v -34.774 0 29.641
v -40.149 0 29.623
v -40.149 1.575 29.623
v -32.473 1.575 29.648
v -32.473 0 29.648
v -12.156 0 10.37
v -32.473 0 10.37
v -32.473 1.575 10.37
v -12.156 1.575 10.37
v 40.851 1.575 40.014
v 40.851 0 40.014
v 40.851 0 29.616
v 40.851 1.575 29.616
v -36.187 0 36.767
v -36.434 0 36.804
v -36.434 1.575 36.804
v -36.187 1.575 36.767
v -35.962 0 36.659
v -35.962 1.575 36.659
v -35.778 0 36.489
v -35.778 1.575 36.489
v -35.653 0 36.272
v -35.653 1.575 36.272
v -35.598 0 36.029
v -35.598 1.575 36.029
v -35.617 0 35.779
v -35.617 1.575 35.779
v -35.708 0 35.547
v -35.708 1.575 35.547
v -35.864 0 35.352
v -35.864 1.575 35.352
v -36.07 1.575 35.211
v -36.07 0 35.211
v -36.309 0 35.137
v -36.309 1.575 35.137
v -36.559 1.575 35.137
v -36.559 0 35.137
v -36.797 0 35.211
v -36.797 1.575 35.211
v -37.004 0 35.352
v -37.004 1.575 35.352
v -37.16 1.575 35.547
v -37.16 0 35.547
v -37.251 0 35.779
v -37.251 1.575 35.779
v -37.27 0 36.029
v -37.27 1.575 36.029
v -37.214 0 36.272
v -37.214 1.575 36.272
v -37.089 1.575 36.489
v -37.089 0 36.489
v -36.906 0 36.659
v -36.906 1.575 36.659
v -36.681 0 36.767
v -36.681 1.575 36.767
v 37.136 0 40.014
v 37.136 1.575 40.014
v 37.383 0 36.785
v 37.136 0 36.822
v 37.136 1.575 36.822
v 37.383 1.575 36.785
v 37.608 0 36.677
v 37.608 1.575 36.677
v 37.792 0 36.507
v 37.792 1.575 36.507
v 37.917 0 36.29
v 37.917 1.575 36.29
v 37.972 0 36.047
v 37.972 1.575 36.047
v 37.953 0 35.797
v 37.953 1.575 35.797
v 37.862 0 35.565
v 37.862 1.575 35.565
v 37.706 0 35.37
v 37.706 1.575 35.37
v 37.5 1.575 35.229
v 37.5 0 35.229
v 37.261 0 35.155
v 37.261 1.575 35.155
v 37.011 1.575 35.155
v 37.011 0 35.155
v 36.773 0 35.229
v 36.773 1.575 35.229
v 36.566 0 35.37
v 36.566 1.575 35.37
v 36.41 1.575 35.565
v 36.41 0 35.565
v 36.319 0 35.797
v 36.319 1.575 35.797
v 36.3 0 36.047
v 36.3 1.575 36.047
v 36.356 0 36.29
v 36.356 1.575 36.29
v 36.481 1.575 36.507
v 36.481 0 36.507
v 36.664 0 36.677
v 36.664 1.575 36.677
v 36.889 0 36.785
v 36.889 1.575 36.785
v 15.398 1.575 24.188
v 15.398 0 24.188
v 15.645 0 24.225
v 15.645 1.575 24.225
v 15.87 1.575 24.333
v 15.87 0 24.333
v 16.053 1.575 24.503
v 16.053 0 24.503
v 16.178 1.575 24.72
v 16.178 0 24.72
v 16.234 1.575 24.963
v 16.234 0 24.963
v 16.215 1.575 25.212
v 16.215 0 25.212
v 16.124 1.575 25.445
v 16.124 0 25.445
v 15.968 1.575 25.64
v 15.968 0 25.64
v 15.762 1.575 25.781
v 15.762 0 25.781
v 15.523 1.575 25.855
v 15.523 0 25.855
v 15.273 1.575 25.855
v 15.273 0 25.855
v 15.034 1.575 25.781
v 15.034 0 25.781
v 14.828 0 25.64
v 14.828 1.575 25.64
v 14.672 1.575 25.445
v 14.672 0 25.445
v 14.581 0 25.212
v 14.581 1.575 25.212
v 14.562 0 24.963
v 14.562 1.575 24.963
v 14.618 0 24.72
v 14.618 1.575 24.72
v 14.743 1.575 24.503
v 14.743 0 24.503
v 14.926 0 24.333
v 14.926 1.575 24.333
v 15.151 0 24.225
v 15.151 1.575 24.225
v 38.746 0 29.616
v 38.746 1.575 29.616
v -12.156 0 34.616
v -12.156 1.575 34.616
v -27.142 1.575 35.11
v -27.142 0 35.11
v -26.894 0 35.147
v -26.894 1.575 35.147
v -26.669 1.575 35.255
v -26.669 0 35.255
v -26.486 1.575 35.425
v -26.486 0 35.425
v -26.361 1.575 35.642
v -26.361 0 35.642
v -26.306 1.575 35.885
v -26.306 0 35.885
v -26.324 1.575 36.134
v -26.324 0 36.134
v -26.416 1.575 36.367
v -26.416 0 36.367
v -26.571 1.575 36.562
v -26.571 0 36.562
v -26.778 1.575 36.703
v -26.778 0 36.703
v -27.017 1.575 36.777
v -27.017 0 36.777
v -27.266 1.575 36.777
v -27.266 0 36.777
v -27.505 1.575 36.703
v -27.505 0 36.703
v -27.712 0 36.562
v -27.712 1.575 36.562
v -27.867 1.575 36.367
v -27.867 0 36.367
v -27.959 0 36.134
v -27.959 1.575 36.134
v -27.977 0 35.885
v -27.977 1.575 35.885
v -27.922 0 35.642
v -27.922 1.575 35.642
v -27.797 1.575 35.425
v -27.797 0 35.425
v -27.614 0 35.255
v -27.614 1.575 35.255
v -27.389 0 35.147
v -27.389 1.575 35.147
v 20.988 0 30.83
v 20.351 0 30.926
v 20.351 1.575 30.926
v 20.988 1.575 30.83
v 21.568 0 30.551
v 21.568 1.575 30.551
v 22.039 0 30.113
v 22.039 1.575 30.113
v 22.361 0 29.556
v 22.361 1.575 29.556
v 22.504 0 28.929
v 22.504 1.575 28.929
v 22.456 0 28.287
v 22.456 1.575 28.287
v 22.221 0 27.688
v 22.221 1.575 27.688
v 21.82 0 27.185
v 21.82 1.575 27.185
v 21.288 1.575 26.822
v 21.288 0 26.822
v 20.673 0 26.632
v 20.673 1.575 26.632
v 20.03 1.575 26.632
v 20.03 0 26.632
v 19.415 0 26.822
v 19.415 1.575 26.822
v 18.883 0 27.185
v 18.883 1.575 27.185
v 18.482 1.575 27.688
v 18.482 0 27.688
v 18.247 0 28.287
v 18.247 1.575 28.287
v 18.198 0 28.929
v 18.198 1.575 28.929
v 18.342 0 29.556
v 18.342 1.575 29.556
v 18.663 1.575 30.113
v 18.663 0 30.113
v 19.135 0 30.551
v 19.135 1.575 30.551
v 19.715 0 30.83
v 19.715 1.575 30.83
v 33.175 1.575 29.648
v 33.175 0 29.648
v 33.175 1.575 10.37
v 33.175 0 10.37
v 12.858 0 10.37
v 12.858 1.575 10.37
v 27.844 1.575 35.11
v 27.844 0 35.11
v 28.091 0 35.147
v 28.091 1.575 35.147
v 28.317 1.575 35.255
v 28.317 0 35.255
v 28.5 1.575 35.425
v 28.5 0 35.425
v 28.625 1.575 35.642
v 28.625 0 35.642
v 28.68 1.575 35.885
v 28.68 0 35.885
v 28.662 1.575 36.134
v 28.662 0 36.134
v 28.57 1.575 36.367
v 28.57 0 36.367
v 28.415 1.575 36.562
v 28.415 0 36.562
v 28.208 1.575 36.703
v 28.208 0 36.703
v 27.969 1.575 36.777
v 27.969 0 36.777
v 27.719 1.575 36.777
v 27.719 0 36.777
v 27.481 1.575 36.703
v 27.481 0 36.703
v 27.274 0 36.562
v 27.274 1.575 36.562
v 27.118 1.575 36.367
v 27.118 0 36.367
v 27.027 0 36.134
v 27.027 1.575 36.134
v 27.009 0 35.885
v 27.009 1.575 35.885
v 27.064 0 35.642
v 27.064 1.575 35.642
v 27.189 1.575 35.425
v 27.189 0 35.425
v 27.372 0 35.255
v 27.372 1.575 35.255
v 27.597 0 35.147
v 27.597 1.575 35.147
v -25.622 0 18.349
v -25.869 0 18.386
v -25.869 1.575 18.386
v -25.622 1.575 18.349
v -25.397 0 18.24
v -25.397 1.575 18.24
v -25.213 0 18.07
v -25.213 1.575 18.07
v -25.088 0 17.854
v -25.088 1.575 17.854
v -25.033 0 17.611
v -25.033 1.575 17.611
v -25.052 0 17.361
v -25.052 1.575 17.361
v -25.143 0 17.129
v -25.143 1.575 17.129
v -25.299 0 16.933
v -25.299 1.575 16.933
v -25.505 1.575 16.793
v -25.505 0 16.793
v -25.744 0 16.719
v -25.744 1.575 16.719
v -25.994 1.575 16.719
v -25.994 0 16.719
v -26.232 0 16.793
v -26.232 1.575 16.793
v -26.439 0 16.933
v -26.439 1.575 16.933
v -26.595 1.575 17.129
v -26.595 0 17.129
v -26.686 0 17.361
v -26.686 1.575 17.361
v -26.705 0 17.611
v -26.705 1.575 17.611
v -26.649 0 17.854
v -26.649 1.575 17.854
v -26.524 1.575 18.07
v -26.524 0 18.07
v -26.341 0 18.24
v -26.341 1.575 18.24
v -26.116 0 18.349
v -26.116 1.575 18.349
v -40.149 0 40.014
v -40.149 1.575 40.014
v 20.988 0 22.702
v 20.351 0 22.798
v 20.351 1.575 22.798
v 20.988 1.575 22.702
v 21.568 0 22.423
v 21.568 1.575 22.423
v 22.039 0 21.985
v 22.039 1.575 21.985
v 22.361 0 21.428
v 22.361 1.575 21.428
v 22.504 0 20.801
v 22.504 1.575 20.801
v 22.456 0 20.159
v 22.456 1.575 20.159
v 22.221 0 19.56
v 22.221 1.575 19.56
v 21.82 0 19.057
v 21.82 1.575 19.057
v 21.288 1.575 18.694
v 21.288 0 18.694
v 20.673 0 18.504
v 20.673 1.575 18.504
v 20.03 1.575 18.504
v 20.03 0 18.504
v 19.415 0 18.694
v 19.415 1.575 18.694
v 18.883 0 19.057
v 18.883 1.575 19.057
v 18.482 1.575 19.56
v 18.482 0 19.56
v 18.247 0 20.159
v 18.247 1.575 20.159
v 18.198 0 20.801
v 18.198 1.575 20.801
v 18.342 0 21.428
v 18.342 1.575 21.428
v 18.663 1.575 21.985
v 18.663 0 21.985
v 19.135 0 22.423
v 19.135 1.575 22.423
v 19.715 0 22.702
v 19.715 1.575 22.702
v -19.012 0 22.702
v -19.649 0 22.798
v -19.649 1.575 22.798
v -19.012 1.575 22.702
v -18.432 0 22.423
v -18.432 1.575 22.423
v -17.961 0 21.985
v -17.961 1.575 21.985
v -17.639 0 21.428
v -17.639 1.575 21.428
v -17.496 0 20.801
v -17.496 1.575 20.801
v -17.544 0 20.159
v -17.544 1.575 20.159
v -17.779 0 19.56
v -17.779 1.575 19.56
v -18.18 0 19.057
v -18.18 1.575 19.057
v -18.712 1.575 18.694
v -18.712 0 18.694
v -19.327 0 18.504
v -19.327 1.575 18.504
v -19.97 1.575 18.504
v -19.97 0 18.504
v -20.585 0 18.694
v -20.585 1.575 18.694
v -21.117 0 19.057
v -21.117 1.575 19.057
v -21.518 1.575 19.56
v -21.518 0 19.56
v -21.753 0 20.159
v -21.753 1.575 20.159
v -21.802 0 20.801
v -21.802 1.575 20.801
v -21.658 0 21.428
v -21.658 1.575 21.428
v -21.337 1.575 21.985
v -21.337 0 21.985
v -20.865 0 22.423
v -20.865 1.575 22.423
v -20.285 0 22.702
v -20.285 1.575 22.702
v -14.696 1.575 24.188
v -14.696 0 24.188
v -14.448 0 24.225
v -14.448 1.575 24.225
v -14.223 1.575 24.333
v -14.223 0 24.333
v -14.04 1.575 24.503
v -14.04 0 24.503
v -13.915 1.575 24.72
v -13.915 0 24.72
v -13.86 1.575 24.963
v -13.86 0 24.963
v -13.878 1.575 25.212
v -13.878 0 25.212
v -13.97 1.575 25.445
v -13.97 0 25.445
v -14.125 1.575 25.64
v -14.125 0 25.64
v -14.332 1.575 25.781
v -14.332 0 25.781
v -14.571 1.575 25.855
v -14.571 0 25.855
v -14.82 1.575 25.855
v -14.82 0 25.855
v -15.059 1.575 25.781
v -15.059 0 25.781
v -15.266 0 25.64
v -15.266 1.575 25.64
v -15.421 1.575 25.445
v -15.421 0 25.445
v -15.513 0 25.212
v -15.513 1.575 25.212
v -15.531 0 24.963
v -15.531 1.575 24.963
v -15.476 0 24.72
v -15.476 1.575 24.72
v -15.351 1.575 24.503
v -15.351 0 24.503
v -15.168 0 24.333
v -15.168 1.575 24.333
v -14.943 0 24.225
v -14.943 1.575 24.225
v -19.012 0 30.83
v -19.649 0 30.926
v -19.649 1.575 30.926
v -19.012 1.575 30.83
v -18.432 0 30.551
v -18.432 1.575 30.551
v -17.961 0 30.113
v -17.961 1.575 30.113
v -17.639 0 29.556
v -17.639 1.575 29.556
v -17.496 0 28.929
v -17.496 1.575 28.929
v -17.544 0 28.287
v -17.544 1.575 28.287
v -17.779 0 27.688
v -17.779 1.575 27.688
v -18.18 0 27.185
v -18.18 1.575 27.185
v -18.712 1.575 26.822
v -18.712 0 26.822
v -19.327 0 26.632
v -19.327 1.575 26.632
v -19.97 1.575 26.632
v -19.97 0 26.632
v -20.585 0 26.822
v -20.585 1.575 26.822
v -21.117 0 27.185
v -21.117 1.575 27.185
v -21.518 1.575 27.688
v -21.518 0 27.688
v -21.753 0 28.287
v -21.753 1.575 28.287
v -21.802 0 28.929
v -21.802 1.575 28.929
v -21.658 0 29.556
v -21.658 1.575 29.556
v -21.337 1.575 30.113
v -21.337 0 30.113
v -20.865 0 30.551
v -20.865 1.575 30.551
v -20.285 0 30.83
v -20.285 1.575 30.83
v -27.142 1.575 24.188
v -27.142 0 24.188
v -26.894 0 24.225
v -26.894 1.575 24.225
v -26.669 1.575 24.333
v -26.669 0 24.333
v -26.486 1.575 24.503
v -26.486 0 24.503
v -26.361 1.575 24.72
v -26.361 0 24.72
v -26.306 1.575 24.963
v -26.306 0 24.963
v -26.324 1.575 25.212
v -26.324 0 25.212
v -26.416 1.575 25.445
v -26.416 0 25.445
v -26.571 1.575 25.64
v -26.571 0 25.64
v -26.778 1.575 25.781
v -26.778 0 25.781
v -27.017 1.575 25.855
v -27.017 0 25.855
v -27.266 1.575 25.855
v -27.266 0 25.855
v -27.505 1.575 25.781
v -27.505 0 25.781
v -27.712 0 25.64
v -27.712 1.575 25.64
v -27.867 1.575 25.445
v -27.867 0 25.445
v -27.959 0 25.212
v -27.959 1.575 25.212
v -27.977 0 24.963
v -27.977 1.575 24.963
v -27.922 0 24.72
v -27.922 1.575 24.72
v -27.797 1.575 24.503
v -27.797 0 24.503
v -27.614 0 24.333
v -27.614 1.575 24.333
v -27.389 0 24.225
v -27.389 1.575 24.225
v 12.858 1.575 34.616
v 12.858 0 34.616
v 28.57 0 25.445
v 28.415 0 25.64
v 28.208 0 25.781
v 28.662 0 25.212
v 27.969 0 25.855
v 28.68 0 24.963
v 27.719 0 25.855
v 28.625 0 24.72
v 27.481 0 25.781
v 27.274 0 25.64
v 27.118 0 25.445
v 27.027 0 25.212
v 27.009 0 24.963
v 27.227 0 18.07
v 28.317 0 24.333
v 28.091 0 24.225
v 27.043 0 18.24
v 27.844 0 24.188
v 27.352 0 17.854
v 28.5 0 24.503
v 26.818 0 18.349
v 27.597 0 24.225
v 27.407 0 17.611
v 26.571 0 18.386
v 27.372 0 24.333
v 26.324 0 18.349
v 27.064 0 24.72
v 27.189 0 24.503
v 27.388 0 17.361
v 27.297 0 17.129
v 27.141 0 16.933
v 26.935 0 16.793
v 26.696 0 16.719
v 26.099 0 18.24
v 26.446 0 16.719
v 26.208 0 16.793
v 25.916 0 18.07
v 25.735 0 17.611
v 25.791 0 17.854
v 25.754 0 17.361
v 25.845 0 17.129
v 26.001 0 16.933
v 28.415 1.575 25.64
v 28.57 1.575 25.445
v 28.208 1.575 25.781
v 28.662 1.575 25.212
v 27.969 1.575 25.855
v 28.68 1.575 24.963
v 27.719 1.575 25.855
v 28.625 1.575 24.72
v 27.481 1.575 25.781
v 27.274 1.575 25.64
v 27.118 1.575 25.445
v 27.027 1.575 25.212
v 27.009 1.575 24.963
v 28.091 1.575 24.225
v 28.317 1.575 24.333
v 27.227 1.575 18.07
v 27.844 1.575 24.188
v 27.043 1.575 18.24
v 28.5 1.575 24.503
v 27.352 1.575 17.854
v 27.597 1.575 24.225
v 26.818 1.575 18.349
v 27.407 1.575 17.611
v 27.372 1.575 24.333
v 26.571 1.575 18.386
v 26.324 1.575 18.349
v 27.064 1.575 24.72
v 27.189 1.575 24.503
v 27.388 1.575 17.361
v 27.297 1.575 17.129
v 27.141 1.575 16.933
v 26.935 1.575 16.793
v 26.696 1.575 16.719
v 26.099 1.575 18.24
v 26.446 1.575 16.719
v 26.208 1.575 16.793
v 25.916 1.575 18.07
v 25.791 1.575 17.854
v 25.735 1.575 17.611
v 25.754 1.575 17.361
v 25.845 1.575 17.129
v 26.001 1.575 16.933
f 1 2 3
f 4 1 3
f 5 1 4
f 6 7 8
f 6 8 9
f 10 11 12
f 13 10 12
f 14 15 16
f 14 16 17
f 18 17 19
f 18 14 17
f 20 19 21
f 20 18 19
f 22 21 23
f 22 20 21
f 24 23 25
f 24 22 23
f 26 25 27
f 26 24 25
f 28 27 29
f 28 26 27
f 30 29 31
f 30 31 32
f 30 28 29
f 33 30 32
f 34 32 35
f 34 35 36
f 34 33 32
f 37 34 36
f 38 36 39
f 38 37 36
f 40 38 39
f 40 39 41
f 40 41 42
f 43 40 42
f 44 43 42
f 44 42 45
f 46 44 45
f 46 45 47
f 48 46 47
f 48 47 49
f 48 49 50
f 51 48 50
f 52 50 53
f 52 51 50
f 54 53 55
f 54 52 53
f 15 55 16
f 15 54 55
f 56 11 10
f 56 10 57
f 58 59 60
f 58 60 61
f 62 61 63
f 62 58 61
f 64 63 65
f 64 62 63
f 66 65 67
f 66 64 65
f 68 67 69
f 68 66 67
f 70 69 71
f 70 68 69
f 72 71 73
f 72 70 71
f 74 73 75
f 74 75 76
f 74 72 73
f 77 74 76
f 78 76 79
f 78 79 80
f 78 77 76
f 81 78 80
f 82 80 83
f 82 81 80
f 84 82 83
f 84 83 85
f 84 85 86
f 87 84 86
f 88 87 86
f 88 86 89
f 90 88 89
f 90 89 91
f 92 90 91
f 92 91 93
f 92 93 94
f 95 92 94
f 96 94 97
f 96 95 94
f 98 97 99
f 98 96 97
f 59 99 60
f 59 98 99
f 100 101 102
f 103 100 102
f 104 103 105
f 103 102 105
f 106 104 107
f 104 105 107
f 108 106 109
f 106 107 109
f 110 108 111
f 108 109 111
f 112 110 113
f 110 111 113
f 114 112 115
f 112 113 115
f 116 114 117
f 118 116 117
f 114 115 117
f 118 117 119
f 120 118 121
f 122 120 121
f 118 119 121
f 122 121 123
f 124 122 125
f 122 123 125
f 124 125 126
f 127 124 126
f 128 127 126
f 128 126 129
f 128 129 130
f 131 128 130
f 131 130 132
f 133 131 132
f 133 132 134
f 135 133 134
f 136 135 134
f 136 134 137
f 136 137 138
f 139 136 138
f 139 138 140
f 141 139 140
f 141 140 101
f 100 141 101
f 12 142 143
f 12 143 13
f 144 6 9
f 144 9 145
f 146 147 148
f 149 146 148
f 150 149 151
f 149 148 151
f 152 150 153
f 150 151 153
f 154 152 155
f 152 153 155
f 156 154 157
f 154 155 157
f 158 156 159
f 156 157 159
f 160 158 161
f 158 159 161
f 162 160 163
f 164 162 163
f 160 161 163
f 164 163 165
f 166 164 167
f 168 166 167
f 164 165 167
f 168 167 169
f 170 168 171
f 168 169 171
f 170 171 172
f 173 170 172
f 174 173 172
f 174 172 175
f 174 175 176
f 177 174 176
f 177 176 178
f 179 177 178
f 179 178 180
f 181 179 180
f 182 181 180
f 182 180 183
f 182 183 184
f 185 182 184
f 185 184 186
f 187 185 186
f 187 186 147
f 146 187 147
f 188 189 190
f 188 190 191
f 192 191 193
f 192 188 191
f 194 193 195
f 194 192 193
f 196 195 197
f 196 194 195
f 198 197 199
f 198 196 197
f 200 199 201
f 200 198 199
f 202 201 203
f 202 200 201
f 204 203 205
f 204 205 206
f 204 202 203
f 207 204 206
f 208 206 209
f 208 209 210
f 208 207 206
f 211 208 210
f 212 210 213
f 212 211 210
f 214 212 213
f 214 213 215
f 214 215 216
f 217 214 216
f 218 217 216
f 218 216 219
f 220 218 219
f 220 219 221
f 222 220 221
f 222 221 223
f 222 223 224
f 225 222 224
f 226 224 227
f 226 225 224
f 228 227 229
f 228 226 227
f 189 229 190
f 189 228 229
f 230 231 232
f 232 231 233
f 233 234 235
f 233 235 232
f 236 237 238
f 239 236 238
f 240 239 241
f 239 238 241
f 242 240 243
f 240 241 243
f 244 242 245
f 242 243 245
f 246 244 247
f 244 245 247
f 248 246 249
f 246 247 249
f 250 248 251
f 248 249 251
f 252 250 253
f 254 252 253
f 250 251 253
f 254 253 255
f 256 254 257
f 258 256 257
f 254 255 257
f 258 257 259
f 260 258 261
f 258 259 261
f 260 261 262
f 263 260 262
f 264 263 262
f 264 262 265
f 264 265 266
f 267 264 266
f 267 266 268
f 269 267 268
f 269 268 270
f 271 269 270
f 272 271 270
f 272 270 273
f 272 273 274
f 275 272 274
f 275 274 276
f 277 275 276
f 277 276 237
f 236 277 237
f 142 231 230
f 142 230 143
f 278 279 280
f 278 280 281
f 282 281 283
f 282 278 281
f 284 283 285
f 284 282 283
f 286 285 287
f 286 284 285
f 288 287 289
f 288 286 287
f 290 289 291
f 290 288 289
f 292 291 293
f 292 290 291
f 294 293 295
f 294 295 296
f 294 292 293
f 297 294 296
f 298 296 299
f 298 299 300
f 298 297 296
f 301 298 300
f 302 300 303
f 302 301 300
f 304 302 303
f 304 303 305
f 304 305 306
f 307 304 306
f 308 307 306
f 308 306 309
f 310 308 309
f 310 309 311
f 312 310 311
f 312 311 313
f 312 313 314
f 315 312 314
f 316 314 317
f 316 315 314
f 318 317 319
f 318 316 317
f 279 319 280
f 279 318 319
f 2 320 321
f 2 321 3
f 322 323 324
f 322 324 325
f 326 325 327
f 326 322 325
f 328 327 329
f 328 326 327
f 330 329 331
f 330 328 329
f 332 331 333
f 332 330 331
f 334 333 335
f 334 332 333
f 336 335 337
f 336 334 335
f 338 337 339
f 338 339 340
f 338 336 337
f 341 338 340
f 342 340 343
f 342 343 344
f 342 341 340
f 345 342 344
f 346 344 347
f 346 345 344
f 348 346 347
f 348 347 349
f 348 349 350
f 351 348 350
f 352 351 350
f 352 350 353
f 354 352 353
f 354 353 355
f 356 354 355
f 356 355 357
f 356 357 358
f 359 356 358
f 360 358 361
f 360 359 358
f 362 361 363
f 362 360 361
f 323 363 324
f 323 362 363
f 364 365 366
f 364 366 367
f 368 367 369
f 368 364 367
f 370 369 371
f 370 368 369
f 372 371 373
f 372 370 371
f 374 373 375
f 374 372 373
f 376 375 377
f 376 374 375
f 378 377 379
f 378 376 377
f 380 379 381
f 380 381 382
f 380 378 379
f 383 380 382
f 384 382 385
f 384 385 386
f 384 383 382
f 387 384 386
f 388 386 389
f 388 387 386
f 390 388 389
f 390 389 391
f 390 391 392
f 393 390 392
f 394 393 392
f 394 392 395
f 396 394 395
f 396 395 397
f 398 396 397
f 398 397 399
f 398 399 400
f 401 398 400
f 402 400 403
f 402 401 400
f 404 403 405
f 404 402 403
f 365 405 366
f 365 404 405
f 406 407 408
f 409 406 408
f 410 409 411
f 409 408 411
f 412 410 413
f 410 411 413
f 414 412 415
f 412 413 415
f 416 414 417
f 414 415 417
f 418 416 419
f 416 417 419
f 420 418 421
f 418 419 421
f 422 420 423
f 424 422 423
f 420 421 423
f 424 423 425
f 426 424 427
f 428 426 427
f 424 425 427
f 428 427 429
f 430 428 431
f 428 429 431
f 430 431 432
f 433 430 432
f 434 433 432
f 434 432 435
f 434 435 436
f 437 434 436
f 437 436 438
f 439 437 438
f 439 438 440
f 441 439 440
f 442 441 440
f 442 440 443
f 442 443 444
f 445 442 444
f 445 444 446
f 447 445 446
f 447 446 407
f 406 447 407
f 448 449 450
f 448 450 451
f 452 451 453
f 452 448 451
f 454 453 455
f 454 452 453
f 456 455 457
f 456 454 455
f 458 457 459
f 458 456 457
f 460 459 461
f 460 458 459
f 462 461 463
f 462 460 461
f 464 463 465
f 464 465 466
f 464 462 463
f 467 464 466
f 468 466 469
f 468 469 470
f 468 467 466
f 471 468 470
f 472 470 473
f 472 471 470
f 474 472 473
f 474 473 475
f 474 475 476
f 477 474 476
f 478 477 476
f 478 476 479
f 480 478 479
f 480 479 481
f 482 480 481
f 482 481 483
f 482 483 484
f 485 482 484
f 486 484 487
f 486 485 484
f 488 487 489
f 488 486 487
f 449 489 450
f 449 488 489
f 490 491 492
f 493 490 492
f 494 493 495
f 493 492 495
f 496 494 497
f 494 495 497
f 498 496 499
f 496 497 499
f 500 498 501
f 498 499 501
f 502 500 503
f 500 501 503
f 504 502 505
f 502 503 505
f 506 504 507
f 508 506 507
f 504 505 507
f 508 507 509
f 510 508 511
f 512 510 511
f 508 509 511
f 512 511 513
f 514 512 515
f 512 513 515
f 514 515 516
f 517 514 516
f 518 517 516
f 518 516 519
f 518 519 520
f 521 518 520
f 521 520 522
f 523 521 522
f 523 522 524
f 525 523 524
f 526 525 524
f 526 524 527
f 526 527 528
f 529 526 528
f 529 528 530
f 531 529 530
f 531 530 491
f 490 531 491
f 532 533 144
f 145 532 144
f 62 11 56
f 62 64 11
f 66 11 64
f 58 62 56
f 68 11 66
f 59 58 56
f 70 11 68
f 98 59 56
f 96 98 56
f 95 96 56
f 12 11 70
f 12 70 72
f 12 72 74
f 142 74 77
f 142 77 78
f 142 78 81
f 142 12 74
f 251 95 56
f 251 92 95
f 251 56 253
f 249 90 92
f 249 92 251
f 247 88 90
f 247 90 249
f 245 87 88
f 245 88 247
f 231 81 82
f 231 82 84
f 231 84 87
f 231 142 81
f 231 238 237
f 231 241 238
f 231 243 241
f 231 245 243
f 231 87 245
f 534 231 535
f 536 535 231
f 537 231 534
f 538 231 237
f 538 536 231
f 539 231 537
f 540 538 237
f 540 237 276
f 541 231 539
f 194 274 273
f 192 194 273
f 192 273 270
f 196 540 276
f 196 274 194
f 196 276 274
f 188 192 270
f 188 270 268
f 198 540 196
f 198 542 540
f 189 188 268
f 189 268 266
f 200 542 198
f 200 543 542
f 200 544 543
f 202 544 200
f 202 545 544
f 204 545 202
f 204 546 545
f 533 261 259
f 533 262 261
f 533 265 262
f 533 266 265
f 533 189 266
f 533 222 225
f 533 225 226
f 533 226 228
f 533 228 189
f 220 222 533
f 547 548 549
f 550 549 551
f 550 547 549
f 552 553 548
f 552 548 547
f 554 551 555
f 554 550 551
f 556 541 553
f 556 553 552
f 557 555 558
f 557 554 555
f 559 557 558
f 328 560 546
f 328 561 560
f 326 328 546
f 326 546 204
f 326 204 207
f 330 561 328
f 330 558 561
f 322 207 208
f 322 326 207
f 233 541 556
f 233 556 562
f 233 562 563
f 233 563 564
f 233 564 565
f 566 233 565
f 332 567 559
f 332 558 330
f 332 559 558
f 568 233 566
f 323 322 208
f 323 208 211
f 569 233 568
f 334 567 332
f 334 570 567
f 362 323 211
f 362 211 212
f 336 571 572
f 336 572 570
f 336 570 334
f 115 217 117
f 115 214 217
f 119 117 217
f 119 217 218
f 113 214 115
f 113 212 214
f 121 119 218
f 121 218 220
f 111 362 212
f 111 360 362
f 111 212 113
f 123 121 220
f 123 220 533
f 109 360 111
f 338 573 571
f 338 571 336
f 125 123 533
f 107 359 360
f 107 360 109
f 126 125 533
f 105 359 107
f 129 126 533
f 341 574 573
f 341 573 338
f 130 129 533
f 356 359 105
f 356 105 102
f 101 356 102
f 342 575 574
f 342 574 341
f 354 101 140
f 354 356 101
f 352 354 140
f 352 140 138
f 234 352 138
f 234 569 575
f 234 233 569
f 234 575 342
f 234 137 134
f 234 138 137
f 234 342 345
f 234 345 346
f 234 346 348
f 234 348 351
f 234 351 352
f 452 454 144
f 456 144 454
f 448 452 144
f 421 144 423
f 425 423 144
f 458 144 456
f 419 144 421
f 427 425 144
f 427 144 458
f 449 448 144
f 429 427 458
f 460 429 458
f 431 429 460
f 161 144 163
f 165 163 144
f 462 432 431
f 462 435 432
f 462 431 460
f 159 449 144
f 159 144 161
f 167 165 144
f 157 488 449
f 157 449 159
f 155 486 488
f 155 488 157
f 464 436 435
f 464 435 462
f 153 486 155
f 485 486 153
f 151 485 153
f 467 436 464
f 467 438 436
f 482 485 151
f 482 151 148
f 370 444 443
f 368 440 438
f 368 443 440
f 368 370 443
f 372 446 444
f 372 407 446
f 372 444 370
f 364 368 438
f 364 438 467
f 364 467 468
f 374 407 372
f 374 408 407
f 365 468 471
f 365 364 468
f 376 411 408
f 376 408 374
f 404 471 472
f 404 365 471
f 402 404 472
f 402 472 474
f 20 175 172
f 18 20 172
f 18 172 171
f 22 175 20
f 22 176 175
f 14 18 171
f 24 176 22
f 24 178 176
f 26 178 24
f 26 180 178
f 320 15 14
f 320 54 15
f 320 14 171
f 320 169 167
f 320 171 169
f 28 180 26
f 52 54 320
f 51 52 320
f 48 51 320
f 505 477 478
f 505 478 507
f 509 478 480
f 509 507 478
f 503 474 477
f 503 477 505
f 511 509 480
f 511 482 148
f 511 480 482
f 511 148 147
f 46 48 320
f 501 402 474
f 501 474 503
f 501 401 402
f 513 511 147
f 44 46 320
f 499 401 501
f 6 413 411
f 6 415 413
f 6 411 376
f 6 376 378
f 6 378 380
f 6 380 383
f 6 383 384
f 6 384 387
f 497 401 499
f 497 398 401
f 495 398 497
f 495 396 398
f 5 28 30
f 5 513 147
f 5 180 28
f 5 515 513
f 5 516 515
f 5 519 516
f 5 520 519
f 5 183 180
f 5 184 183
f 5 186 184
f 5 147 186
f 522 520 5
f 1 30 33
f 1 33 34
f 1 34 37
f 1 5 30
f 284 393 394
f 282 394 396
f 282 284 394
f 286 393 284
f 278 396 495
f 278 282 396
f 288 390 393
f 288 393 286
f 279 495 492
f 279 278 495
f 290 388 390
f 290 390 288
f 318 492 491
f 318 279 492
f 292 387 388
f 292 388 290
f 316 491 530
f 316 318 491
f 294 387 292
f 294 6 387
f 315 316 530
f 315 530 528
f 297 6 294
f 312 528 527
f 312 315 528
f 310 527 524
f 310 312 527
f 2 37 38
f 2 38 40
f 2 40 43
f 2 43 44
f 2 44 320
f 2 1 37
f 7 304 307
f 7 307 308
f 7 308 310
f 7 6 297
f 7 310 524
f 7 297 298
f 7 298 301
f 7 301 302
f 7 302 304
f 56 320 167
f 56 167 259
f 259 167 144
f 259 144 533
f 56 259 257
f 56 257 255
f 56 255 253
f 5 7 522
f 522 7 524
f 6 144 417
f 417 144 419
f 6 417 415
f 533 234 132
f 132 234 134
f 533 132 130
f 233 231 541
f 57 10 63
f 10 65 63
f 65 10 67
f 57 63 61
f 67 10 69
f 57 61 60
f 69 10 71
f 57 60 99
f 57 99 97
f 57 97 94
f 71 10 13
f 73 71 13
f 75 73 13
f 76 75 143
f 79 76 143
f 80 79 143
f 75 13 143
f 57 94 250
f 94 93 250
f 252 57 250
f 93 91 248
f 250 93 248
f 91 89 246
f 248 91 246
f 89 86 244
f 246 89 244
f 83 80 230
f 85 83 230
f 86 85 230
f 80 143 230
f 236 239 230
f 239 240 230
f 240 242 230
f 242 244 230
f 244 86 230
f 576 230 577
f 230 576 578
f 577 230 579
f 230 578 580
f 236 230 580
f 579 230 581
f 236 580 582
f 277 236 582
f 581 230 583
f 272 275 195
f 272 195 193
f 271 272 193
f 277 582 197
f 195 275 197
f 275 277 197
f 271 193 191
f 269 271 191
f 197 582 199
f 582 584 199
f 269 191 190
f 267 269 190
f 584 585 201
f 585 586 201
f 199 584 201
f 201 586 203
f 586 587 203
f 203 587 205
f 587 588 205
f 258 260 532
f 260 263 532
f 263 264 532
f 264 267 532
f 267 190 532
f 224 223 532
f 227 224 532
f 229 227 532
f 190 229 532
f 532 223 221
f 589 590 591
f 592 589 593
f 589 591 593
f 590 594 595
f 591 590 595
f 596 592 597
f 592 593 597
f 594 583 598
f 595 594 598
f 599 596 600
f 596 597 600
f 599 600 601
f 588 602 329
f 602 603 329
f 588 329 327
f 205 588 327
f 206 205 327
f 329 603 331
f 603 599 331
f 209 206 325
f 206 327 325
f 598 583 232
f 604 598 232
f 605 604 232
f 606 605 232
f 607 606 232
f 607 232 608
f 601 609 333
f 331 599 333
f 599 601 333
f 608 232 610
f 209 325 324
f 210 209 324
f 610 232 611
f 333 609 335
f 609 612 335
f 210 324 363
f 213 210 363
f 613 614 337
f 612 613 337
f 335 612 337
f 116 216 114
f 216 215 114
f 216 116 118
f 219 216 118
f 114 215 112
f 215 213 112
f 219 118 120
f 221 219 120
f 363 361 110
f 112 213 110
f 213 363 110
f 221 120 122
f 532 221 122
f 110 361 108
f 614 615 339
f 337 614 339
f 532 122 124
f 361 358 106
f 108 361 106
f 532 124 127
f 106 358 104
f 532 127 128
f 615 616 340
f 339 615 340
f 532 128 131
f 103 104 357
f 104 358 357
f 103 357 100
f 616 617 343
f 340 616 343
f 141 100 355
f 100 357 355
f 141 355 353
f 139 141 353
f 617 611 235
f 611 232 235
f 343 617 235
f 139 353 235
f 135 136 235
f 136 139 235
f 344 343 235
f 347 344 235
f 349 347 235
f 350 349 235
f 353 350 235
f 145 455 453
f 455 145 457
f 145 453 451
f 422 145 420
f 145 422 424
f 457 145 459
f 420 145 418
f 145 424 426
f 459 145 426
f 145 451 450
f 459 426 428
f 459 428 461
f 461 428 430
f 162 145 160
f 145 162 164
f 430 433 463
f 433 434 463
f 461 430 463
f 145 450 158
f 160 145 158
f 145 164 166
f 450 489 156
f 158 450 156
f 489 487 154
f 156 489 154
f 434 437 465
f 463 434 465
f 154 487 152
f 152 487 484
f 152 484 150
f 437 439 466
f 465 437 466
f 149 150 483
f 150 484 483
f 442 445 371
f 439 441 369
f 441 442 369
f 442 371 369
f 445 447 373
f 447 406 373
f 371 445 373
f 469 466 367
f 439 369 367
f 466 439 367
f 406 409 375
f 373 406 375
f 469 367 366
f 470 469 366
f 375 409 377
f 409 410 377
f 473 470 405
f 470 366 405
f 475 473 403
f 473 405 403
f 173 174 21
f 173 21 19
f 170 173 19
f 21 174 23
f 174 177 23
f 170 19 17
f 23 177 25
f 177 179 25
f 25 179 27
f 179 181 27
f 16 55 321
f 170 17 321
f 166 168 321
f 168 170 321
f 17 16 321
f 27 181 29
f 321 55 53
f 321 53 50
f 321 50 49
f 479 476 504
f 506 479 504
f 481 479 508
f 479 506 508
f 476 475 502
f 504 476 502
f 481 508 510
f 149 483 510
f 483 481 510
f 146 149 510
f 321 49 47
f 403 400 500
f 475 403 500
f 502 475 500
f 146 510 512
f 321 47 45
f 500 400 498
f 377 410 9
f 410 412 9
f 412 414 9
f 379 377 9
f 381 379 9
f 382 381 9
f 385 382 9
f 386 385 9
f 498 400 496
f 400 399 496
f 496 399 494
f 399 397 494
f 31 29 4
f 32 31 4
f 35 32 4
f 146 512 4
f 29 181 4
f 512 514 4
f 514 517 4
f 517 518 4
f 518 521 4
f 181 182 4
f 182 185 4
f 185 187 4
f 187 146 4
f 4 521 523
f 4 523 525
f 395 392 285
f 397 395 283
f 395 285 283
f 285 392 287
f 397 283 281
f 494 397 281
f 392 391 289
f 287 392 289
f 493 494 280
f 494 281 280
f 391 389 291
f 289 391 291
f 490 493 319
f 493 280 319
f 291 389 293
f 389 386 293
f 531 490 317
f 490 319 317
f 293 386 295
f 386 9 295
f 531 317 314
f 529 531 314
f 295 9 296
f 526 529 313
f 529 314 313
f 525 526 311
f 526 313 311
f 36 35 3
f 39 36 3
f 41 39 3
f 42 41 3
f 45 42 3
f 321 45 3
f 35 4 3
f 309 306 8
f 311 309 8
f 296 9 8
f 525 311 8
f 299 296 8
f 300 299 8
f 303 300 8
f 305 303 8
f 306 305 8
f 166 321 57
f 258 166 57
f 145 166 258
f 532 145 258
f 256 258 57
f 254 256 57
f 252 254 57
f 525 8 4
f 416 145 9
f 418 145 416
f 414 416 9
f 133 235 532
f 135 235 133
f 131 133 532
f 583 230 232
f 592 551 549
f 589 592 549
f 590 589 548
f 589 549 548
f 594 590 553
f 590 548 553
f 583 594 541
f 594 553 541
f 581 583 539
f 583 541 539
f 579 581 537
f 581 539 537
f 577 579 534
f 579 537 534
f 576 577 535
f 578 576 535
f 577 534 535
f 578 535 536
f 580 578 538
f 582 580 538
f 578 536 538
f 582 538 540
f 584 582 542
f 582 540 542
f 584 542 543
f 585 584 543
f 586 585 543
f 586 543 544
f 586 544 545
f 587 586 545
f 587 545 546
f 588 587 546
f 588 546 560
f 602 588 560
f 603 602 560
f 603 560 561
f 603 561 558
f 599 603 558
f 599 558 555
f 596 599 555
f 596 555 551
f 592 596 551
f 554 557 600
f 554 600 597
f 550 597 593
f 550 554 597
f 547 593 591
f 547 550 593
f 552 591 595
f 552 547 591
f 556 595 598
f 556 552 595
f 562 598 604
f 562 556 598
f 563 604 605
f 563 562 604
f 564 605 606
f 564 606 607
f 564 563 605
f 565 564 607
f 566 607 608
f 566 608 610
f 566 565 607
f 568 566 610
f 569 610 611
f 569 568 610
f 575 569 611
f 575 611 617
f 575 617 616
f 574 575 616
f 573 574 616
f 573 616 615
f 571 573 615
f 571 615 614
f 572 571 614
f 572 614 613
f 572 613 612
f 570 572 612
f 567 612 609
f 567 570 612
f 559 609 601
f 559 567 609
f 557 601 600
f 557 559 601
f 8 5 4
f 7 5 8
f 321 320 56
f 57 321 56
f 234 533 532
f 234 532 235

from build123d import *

# Parameters (mm, degrees)
SKETCH1_R           = 0.8382
SKETCH1_R_2         = 2.159
BOSS_EXTRUDE1_DEPTH = 1.575
SKETCH2_W           = 86.242658642
SKETCH2_H           = 6.602
CUT_EXTRUDE1_DEPTH  = 65.362755899
CUT_EXTRUDE2_DEPTH  = 60.755092082
CUT_EXTRUDE3_DEPTH  = 60.755092082
SKETCH6_R           = 0.8382
CUT_EXTRUDE4_DEPTH  = 2.54


with BuildPart() as part:
    # Sketch1 → Boss-Extrude1 (new body)
    with BuildSketch(Plane(origin=(0, 0, 0), x_dir=(1, 0, 0), z_dir=(0, 1, 0))):
        Polygon((44.351293299, -40.014412246), (37.136293299, -40.014412246), (37.136293299, -46.615946892), (29.968293307, -46.615946892), (-30.083706693, -46.615946892), (-36.433706701, -46.615946892), (-36.433706701, -40.014412246), (-43.648706701, -40.014412246), (-43.648706701, -30.885946892), (-43.648706701, -29.647946892), (-42.378706693, -29.615946892), (-32.472706701, -29.647946892), (-32.472706701, -10.370428445), (-12.155556701, -10.370428445), (-12.155556701, -34.615947016), (-11.557706701, -34.615947016), (12.260293299, -34.615947016), (12.858143299, -34.615947016), (12.858143299, -10.370428445), (33.175293299, -10.370428445), (33.175293299, -12.929386892), (33.175293299, -29.647946892), (38.746293307, -29.615946892), (42.351293307, -29.615946892), (44.351293299, -29.647946892), (44.351293299, -31.651946892), align=None)
        with Locations(Location((-36.433706701, -35.965946892, 0), (0, 0, 270))):
            Circle(SKETCH1_R, mode=Mode.SUBTRACT)
        with Locations(Location((37.136293299, -35.983946892, 0), (0, 0, 270))):
            Circle(SKETCH1_R, mode=Mode.SUBTRACT)
        with Locations(Location((-19.648556701, -28.76738335, 0), (0, 0, 270))):
            Circle(SKETCH1_R_2, mode=Mode.SUBTRACT)
        with Locations(Location((-19.648556701, -20.63938335, 0), (0, 0, 270))):
            Circle(SKETCH1_R_2, mode=Mode.SUBTRACT)
        with Locations(Location((20.351397299, -20.63938335, 0), (0, 0, 270))):
            Circle(SKETCH1_R_2, mode=Mode.SUBTRACT)
        with Locations(Location((20.351397299, -28.76738335, 0), (0, 0, 270))):
            Circle(SKETCH1_R_2, mode=Mode.SUBTRACT)
        with Locations(Location((-25.868706701, -17.547875601, 0), (0, 0, 270))):
            Circle(SKETCH1_R, mode=Mode.SUBTRACT)
        with Locations(Location((26.571293299, -17.547875601, 0), (0, 0, 270))):
            Circle(SKETCH1_R, mode=Mode.SUBTRACT)
    extrude(amount=BOSS_EXTRUDE1_DEPTH)

    # Sketch2 → Cut-Extrude1 (cut, through all)
    with BuildSketch(Plane.XZ):
        with Locations((-5.985036022, 43.314946892)):
            Rectangle(SKETCH2_W, SKETCH2_H)
    extrude(amount=-CUT_EXTRUDE1_DEPTH, mode=Mode.SUBTRACT)

    # Sketch3 → Cut-Extrude2 (cut, through all)
    with BuildSketch(Plane.XZ):
        Polygon((-40.148706701, 40.013946892), (-40.148706701, 29.623150607), (-34.773706693, 29.640513821), (-34.773706693, 8.975624969), (-46.772834391, 8.975624969), (-46.772834391, 40.013946892), align=None)
    extrude(amount=-CUT_EXTRUDE2_DEPTH, mode=Mode.SUBTRACT)

    # Sketch4 → Cut-Extrude3 (cut, through all)
    with BuildSketch(Plane.XZ):
        Polygon((40.851293299, 40.014412246), (40.851293299, 32.420104455), (40.851293299, 29.615946892), (35.476293307, 29.615946892), (35.476293307, 10.370428445), (54.710892309, 10.370428445), (54.710892309, 40.014412246), align=None)
    extrude(amount=-CUT_EXTRUDE3_DEPTH, mode=Mode.SUBTRACT)

    # Sketch6 → Cut-Extrude4 (cut)
    with BuildSketch(Plane(origin=(0, 0, 0), x_dir=(-1, 0, 0), z_dir=(0, -1, 0))):
        with Locations(Location((27.141556701, -35.947946892, 0), (0, 0, 90))):
            Circle(SKETCH6_R)
        with Locations(Location((27.141556701, -25.025946892, 0), (0, 0, 90))):
            Circle(SKETCH6_R)
        with Locations(Location((14.695556701, -25.025946892, 0), (0, 0, 90))):
            Circle(SKETCH6_R)
        with Locations(Location((-15.398143299, -25.025946892, 0), (0, 0, 90))):
            Circle(SKETCH6_R)
        with Locations(Location((-27.844397299, -25.025946892, 0), (0, 0, 90))):
            Circle(SKETCH6_R)
        with Locations(Location((-27.844397299, -35.947946892, 0), (0, 0, 90))):
            Circle(SKETCH6_R)
    extrude(amount=-CUT_EXTRUDE4_DEPTH, mode=Mode.SUBTRACT)


solid = part.part
